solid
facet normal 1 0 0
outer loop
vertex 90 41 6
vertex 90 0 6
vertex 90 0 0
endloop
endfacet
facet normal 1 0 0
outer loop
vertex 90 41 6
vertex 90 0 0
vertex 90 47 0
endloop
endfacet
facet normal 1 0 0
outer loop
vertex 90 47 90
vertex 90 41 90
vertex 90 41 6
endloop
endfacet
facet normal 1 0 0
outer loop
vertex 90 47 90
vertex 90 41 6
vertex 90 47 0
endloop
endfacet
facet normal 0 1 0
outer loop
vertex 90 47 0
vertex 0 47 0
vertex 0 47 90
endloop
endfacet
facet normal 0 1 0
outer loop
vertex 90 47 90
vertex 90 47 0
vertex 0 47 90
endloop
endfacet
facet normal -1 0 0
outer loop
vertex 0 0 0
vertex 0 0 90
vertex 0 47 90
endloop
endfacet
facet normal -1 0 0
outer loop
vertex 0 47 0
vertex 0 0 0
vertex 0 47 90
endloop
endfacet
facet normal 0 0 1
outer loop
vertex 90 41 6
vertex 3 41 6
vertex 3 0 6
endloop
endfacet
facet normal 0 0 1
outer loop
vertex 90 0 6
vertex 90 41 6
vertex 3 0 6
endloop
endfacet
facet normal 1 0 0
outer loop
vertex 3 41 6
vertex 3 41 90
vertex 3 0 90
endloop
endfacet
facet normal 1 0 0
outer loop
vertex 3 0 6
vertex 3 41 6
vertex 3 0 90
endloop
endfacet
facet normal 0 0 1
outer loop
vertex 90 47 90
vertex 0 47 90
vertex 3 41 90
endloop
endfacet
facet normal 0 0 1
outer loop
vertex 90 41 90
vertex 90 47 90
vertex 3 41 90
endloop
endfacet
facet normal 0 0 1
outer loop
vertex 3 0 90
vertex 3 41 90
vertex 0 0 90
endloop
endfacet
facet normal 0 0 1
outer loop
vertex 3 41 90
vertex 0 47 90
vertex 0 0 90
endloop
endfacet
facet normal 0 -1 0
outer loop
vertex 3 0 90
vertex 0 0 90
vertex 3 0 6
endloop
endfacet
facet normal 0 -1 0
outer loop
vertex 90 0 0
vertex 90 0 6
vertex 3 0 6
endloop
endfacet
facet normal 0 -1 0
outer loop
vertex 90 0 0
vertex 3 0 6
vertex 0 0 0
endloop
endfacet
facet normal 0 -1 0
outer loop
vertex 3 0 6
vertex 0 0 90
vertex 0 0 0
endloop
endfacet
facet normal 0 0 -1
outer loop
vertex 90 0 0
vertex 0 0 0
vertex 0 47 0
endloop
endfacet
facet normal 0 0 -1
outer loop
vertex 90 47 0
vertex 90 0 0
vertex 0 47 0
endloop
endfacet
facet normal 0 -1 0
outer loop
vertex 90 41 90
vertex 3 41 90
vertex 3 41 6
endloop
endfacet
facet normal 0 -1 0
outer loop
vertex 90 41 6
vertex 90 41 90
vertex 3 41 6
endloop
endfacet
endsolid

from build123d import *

# Parameters (mm, degrees)
F1_DEPTH = 90
F3_W     = 47
F3_H     = 90
F4_DEPTH = 3


# Not quite as in the source:
# - the program builds the solid bodies; features that only make, move or delete a surface that nothing else refers to are left out


with BuildPart() as f1:
    # F0 (on Right) → F1 (new body)
    with BuildSketch(Plane.YZ):
        Polygon((47, 0), (47, 90), (41, 90), (41, 6), (0, 6), (0, 0), align=None)
    extrude(amount=F1_DEPTH)

    # F3 (on face) → F4 (join)
    with BuildSketch(Plane(origin=(0, 0, 0), x_dir=(0, -1, 0), z_dir=(-1, 0, 0))):
        with Locations((-23.5, 45)):
            Rectangle(F3_W, F3_H)
    extrude(amount=-F4_DEPTH)


solid = f1.part
